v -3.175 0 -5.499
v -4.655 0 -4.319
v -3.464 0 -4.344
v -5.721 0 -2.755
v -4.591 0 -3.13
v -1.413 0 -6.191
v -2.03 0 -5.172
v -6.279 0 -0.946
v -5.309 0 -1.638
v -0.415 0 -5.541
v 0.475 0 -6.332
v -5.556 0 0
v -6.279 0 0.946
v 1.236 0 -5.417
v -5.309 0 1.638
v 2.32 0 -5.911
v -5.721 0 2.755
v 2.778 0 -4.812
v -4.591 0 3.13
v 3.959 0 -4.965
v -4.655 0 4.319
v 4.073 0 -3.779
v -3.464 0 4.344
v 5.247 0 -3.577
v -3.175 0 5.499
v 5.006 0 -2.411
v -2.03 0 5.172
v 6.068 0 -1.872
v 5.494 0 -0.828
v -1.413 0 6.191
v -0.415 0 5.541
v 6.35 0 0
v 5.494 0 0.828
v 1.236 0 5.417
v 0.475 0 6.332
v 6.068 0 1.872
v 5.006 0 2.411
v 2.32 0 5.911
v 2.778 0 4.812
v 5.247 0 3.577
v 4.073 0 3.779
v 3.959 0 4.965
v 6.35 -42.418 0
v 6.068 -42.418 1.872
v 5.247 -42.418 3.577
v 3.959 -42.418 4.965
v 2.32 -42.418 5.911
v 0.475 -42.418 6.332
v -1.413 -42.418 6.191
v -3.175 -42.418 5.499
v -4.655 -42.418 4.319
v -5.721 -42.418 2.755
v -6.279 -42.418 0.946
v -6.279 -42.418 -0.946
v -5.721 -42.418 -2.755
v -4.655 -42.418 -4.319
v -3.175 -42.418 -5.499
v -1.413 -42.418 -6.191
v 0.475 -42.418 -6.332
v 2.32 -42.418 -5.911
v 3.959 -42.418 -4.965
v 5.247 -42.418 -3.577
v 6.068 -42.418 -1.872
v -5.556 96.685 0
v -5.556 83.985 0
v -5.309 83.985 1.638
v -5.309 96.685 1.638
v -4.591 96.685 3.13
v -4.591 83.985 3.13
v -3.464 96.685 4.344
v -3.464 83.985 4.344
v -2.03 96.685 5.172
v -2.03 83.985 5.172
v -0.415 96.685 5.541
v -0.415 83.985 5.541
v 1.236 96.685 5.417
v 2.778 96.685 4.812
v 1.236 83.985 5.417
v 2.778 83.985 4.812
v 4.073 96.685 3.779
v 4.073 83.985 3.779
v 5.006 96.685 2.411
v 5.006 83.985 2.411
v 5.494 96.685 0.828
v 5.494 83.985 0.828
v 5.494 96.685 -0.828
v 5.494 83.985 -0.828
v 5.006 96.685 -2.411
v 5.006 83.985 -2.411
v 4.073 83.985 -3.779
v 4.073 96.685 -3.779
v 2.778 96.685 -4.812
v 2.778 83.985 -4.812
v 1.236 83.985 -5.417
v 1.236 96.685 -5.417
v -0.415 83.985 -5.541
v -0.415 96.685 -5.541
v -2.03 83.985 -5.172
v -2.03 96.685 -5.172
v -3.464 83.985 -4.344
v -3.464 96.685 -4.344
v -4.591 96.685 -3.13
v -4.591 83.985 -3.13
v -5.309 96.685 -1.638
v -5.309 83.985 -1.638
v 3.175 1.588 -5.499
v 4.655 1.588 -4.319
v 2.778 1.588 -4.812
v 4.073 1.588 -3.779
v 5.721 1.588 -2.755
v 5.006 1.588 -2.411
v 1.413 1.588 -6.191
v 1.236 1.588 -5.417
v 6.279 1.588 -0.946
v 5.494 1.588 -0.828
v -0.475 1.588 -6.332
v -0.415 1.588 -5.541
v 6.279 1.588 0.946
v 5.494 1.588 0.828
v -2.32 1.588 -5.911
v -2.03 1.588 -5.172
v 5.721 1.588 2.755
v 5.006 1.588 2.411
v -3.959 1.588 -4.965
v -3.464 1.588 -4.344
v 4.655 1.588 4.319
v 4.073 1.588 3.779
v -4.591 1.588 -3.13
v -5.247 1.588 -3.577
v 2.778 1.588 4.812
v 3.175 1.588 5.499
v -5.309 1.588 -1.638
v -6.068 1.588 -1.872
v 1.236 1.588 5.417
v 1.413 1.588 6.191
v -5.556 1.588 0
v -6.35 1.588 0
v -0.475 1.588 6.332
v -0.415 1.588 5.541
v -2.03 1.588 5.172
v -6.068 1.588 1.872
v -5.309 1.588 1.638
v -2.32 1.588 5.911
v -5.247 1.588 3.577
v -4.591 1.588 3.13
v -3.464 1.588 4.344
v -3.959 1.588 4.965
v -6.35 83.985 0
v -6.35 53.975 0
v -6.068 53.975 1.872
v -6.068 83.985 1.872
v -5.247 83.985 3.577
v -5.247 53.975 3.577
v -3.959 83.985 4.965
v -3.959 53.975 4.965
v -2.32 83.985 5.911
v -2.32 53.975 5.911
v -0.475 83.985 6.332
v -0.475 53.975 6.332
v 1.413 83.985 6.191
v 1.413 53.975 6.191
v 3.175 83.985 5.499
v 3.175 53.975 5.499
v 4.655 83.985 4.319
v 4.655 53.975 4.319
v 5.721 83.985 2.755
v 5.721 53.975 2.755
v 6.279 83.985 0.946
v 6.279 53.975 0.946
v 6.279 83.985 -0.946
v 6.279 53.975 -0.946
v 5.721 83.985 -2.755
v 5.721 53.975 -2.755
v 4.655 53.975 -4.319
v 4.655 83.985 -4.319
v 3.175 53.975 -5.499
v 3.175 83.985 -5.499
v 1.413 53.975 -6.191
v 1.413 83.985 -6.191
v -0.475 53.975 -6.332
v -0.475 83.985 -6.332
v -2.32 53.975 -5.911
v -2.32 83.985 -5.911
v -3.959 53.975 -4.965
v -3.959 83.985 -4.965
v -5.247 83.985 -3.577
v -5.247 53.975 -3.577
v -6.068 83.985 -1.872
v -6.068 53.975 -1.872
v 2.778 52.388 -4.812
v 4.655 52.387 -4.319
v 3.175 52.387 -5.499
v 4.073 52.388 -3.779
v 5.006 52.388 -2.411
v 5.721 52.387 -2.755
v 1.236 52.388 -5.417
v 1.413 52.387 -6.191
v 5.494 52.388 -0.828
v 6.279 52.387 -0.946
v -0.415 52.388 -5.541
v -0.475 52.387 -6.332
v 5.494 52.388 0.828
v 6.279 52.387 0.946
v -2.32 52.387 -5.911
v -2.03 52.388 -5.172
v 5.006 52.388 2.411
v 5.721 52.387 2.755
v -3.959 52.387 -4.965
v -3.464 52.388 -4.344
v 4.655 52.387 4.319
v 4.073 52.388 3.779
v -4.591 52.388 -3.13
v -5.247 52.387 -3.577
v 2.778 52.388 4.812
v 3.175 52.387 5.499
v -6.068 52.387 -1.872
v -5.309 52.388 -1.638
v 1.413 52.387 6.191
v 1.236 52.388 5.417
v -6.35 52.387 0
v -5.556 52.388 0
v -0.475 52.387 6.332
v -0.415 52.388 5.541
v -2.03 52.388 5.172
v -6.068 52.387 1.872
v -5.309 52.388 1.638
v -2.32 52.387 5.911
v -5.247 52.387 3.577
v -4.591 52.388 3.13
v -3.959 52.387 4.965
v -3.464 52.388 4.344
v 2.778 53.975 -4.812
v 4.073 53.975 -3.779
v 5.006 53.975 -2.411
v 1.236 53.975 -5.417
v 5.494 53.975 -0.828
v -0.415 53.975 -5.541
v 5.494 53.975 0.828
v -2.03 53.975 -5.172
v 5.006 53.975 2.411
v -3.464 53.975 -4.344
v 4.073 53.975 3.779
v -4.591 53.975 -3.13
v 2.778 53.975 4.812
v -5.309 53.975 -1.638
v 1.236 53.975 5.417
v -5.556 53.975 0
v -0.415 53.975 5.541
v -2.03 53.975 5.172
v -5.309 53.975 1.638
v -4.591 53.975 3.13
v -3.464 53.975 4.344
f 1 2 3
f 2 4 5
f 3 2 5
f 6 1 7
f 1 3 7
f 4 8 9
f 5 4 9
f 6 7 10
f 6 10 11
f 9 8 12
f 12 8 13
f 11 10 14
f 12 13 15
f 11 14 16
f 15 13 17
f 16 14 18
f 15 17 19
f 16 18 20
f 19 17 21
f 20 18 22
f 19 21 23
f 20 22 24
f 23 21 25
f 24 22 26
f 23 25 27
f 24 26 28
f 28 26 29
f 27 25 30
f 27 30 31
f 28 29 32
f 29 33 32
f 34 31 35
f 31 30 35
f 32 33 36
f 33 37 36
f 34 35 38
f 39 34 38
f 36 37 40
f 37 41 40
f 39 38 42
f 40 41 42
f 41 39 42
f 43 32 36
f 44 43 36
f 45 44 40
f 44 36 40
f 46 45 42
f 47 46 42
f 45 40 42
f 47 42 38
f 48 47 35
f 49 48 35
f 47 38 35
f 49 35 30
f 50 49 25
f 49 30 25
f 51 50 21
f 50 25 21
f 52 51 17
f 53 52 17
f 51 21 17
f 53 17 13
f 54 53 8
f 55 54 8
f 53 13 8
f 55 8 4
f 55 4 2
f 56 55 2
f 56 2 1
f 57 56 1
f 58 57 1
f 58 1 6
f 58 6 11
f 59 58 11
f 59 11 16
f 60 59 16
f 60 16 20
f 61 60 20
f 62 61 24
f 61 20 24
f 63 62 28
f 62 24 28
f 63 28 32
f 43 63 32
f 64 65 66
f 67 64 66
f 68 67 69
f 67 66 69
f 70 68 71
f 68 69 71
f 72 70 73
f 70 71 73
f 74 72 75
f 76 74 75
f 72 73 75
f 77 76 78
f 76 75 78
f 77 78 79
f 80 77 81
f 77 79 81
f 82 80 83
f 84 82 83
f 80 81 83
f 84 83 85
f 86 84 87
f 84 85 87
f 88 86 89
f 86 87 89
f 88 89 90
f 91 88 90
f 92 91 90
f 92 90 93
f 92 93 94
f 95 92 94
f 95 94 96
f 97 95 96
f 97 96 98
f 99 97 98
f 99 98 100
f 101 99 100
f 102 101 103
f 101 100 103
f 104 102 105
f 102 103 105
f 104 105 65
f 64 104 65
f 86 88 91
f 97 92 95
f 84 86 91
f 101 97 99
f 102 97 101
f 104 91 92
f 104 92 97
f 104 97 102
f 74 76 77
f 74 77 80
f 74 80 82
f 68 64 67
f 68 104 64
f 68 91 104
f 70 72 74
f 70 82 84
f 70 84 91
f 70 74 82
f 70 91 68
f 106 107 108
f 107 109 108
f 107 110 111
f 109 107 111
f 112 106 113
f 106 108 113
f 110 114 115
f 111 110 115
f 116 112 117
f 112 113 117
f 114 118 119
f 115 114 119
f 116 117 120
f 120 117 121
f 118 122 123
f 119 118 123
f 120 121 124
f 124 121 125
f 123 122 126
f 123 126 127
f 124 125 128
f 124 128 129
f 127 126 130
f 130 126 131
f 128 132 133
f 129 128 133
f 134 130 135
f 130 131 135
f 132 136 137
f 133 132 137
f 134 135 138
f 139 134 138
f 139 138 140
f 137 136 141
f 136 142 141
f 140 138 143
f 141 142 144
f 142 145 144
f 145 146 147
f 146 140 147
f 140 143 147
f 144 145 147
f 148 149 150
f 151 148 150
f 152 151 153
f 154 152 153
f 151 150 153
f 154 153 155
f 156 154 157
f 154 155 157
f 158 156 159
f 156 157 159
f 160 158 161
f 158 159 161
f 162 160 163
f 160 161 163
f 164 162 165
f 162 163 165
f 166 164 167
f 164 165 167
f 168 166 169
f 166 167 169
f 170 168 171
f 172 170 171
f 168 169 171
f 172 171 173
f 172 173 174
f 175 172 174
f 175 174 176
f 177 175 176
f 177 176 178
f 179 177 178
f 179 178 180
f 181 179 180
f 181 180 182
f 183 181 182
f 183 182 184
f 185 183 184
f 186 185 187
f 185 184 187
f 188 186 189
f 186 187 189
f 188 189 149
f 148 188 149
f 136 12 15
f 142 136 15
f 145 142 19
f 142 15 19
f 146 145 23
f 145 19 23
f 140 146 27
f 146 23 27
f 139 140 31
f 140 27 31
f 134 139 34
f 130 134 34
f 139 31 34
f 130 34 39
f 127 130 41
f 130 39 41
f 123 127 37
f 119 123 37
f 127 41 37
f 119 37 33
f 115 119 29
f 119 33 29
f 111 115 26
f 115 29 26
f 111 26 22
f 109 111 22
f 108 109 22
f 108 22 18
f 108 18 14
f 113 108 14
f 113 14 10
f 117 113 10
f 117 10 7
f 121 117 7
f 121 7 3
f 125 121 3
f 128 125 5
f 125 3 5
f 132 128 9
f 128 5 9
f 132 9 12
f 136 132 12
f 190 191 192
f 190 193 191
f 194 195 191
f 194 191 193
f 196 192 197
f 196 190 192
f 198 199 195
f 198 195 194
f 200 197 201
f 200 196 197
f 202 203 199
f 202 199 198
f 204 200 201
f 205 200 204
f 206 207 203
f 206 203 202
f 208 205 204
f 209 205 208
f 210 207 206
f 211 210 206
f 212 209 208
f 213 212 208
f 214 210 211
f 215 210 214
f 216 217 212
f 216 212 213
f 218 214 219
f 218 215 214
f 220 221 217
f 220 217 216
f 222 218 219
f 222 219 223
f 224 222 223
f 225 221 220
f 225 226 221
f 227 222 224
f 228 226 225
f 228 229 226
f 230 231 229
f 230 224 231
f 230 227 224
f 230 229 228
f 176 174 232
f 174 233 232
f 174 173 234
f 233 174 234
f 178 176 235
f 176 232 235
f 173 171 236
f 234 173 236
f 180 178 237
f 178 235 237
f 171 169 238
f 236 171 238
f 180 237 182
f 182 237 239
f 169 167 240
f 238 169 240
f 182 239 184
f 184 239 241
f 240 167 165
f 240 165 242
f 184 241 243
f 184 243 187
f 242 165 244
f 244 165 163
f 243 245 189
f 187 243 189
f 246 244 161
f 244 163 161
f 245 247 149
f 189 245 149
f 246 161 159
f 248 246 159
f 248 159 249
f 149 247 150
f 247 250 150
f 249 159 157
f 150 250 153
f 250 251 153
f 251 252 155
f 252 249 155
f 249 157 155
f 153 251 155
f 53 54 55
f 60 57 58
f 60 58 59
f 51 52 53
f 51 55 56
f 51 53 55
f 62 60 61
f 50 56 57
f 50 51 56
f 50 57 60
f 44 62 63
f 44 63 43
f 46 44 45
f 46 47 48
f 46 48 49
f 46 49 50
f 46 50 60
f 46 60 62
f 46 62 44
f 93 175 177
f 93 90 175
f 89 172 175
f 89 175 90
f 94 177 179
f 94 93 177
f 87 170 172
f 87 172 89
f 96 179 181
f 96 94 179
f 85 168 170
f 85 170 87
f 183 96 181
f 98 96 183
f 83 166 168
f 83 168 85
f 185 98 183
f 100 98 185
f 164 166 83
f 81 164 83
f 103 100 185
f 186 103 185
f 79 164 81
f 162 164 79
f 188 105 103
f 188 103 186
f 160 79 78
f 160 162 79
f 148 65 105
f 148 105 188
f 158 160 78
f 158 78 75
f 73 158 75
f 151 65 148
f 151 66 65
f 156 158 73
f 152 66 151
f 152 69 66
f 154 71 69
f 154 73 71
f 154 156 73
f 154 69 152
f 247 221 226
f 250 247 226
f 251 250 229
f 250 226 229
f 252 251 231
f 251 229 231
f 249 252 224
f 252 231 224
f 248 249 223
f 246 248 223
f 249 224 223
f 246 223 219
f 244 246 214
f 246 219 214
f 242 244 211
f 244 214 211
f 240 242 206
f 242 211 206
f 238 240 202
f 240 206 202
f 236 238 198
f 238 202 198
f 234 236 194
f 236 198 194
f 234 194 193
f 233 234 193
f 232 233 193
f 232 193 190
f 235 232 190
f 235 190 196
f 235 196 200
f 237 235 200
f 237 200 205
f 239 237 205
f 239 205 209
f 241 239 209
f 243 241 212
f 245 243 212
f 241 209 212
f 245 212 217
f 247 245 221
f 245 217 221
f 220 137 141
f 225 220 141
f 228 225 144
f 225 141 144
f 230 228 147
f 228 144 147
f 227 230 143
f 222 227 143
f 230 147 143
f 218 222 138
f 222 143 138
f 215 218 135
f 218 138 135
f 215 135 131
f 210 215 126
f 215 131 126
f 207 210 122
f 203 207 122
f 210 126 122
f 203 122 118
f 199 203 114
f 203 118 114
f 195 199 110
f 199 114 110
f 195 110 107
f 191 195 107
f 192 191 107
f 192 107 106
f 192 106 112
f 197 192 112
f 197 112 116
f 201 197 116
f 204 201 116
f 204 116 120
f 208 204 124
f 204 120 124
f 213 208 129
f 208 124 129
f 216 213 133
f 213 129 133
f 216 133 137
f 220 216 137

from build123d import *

# Parameters (mm, degrees)
F0_R      = 6.35
F1_DEPTH  = 42.418
F2_R      = 5.55625
F3_DEPTH  = 1.5875
F4_R      = 6.35
F5_DEPTH  = 50.8
F6_R      = 5.55625
F7_DEPTH  = 1.5875
F8_R      = 6.35
F9_DEPTH  = 30.0101
F10_R     = 5.55625
F11_DEPTH = 12.7


with BuildPart() as f1:
    # F0 (on Front) → F1 (new body)
    with BuildSketch(Plane.XZ):
        Circle(F0_R)
    extrude(amount=F1_DEPTH)

    # F2 (on face) → F3 (join)
    with BuildSketch(Plane(origin=(0, 0, 0), x_dir=(-1, 0, 0), z_dir=(0, 1, 0))):
        Circle(F2_R)
    extrude(amount=F3_DEPTH)

    # F4 (on face) → F5 (join)
    with BuildSketch(Plane(origin=(0, 1.5875, 0), x_dir=(-1, 0, 0), z_dir=(0, 1, 0))):
        Circle(F4_R)
    extrude(amount=F5_DEPTH)

    # F6 (on face) → F7 (join)
    with BuildSketch(Plane(origin=(0, 52.3875, 0), x_dir=(-1, 0, 0), z_dir=(0, 1, 0))):
        Circle(F6_R)
    extrude(amount=F7_DEPTH)

    # F8 (on face) → F9 (join)
    with BuildSketch(Plane(origin=(0, 53.975, 0), x_dir=(-1, 0, 0), z_dir=(0, 1, 0))):
        Circle(F8_R)
    extrude(amount=F9_DEPTH)

    # F10 (on face) → F11 (join)
    with BuildSketch(Plane(origin=(0, 83.9851, 0), x_dir=(-1, 0, 0), z_dir=(0, 1, 0))):
        Circle(F10_R)
    extrude(amount=F11_DEPTH)


solid = f1.part
